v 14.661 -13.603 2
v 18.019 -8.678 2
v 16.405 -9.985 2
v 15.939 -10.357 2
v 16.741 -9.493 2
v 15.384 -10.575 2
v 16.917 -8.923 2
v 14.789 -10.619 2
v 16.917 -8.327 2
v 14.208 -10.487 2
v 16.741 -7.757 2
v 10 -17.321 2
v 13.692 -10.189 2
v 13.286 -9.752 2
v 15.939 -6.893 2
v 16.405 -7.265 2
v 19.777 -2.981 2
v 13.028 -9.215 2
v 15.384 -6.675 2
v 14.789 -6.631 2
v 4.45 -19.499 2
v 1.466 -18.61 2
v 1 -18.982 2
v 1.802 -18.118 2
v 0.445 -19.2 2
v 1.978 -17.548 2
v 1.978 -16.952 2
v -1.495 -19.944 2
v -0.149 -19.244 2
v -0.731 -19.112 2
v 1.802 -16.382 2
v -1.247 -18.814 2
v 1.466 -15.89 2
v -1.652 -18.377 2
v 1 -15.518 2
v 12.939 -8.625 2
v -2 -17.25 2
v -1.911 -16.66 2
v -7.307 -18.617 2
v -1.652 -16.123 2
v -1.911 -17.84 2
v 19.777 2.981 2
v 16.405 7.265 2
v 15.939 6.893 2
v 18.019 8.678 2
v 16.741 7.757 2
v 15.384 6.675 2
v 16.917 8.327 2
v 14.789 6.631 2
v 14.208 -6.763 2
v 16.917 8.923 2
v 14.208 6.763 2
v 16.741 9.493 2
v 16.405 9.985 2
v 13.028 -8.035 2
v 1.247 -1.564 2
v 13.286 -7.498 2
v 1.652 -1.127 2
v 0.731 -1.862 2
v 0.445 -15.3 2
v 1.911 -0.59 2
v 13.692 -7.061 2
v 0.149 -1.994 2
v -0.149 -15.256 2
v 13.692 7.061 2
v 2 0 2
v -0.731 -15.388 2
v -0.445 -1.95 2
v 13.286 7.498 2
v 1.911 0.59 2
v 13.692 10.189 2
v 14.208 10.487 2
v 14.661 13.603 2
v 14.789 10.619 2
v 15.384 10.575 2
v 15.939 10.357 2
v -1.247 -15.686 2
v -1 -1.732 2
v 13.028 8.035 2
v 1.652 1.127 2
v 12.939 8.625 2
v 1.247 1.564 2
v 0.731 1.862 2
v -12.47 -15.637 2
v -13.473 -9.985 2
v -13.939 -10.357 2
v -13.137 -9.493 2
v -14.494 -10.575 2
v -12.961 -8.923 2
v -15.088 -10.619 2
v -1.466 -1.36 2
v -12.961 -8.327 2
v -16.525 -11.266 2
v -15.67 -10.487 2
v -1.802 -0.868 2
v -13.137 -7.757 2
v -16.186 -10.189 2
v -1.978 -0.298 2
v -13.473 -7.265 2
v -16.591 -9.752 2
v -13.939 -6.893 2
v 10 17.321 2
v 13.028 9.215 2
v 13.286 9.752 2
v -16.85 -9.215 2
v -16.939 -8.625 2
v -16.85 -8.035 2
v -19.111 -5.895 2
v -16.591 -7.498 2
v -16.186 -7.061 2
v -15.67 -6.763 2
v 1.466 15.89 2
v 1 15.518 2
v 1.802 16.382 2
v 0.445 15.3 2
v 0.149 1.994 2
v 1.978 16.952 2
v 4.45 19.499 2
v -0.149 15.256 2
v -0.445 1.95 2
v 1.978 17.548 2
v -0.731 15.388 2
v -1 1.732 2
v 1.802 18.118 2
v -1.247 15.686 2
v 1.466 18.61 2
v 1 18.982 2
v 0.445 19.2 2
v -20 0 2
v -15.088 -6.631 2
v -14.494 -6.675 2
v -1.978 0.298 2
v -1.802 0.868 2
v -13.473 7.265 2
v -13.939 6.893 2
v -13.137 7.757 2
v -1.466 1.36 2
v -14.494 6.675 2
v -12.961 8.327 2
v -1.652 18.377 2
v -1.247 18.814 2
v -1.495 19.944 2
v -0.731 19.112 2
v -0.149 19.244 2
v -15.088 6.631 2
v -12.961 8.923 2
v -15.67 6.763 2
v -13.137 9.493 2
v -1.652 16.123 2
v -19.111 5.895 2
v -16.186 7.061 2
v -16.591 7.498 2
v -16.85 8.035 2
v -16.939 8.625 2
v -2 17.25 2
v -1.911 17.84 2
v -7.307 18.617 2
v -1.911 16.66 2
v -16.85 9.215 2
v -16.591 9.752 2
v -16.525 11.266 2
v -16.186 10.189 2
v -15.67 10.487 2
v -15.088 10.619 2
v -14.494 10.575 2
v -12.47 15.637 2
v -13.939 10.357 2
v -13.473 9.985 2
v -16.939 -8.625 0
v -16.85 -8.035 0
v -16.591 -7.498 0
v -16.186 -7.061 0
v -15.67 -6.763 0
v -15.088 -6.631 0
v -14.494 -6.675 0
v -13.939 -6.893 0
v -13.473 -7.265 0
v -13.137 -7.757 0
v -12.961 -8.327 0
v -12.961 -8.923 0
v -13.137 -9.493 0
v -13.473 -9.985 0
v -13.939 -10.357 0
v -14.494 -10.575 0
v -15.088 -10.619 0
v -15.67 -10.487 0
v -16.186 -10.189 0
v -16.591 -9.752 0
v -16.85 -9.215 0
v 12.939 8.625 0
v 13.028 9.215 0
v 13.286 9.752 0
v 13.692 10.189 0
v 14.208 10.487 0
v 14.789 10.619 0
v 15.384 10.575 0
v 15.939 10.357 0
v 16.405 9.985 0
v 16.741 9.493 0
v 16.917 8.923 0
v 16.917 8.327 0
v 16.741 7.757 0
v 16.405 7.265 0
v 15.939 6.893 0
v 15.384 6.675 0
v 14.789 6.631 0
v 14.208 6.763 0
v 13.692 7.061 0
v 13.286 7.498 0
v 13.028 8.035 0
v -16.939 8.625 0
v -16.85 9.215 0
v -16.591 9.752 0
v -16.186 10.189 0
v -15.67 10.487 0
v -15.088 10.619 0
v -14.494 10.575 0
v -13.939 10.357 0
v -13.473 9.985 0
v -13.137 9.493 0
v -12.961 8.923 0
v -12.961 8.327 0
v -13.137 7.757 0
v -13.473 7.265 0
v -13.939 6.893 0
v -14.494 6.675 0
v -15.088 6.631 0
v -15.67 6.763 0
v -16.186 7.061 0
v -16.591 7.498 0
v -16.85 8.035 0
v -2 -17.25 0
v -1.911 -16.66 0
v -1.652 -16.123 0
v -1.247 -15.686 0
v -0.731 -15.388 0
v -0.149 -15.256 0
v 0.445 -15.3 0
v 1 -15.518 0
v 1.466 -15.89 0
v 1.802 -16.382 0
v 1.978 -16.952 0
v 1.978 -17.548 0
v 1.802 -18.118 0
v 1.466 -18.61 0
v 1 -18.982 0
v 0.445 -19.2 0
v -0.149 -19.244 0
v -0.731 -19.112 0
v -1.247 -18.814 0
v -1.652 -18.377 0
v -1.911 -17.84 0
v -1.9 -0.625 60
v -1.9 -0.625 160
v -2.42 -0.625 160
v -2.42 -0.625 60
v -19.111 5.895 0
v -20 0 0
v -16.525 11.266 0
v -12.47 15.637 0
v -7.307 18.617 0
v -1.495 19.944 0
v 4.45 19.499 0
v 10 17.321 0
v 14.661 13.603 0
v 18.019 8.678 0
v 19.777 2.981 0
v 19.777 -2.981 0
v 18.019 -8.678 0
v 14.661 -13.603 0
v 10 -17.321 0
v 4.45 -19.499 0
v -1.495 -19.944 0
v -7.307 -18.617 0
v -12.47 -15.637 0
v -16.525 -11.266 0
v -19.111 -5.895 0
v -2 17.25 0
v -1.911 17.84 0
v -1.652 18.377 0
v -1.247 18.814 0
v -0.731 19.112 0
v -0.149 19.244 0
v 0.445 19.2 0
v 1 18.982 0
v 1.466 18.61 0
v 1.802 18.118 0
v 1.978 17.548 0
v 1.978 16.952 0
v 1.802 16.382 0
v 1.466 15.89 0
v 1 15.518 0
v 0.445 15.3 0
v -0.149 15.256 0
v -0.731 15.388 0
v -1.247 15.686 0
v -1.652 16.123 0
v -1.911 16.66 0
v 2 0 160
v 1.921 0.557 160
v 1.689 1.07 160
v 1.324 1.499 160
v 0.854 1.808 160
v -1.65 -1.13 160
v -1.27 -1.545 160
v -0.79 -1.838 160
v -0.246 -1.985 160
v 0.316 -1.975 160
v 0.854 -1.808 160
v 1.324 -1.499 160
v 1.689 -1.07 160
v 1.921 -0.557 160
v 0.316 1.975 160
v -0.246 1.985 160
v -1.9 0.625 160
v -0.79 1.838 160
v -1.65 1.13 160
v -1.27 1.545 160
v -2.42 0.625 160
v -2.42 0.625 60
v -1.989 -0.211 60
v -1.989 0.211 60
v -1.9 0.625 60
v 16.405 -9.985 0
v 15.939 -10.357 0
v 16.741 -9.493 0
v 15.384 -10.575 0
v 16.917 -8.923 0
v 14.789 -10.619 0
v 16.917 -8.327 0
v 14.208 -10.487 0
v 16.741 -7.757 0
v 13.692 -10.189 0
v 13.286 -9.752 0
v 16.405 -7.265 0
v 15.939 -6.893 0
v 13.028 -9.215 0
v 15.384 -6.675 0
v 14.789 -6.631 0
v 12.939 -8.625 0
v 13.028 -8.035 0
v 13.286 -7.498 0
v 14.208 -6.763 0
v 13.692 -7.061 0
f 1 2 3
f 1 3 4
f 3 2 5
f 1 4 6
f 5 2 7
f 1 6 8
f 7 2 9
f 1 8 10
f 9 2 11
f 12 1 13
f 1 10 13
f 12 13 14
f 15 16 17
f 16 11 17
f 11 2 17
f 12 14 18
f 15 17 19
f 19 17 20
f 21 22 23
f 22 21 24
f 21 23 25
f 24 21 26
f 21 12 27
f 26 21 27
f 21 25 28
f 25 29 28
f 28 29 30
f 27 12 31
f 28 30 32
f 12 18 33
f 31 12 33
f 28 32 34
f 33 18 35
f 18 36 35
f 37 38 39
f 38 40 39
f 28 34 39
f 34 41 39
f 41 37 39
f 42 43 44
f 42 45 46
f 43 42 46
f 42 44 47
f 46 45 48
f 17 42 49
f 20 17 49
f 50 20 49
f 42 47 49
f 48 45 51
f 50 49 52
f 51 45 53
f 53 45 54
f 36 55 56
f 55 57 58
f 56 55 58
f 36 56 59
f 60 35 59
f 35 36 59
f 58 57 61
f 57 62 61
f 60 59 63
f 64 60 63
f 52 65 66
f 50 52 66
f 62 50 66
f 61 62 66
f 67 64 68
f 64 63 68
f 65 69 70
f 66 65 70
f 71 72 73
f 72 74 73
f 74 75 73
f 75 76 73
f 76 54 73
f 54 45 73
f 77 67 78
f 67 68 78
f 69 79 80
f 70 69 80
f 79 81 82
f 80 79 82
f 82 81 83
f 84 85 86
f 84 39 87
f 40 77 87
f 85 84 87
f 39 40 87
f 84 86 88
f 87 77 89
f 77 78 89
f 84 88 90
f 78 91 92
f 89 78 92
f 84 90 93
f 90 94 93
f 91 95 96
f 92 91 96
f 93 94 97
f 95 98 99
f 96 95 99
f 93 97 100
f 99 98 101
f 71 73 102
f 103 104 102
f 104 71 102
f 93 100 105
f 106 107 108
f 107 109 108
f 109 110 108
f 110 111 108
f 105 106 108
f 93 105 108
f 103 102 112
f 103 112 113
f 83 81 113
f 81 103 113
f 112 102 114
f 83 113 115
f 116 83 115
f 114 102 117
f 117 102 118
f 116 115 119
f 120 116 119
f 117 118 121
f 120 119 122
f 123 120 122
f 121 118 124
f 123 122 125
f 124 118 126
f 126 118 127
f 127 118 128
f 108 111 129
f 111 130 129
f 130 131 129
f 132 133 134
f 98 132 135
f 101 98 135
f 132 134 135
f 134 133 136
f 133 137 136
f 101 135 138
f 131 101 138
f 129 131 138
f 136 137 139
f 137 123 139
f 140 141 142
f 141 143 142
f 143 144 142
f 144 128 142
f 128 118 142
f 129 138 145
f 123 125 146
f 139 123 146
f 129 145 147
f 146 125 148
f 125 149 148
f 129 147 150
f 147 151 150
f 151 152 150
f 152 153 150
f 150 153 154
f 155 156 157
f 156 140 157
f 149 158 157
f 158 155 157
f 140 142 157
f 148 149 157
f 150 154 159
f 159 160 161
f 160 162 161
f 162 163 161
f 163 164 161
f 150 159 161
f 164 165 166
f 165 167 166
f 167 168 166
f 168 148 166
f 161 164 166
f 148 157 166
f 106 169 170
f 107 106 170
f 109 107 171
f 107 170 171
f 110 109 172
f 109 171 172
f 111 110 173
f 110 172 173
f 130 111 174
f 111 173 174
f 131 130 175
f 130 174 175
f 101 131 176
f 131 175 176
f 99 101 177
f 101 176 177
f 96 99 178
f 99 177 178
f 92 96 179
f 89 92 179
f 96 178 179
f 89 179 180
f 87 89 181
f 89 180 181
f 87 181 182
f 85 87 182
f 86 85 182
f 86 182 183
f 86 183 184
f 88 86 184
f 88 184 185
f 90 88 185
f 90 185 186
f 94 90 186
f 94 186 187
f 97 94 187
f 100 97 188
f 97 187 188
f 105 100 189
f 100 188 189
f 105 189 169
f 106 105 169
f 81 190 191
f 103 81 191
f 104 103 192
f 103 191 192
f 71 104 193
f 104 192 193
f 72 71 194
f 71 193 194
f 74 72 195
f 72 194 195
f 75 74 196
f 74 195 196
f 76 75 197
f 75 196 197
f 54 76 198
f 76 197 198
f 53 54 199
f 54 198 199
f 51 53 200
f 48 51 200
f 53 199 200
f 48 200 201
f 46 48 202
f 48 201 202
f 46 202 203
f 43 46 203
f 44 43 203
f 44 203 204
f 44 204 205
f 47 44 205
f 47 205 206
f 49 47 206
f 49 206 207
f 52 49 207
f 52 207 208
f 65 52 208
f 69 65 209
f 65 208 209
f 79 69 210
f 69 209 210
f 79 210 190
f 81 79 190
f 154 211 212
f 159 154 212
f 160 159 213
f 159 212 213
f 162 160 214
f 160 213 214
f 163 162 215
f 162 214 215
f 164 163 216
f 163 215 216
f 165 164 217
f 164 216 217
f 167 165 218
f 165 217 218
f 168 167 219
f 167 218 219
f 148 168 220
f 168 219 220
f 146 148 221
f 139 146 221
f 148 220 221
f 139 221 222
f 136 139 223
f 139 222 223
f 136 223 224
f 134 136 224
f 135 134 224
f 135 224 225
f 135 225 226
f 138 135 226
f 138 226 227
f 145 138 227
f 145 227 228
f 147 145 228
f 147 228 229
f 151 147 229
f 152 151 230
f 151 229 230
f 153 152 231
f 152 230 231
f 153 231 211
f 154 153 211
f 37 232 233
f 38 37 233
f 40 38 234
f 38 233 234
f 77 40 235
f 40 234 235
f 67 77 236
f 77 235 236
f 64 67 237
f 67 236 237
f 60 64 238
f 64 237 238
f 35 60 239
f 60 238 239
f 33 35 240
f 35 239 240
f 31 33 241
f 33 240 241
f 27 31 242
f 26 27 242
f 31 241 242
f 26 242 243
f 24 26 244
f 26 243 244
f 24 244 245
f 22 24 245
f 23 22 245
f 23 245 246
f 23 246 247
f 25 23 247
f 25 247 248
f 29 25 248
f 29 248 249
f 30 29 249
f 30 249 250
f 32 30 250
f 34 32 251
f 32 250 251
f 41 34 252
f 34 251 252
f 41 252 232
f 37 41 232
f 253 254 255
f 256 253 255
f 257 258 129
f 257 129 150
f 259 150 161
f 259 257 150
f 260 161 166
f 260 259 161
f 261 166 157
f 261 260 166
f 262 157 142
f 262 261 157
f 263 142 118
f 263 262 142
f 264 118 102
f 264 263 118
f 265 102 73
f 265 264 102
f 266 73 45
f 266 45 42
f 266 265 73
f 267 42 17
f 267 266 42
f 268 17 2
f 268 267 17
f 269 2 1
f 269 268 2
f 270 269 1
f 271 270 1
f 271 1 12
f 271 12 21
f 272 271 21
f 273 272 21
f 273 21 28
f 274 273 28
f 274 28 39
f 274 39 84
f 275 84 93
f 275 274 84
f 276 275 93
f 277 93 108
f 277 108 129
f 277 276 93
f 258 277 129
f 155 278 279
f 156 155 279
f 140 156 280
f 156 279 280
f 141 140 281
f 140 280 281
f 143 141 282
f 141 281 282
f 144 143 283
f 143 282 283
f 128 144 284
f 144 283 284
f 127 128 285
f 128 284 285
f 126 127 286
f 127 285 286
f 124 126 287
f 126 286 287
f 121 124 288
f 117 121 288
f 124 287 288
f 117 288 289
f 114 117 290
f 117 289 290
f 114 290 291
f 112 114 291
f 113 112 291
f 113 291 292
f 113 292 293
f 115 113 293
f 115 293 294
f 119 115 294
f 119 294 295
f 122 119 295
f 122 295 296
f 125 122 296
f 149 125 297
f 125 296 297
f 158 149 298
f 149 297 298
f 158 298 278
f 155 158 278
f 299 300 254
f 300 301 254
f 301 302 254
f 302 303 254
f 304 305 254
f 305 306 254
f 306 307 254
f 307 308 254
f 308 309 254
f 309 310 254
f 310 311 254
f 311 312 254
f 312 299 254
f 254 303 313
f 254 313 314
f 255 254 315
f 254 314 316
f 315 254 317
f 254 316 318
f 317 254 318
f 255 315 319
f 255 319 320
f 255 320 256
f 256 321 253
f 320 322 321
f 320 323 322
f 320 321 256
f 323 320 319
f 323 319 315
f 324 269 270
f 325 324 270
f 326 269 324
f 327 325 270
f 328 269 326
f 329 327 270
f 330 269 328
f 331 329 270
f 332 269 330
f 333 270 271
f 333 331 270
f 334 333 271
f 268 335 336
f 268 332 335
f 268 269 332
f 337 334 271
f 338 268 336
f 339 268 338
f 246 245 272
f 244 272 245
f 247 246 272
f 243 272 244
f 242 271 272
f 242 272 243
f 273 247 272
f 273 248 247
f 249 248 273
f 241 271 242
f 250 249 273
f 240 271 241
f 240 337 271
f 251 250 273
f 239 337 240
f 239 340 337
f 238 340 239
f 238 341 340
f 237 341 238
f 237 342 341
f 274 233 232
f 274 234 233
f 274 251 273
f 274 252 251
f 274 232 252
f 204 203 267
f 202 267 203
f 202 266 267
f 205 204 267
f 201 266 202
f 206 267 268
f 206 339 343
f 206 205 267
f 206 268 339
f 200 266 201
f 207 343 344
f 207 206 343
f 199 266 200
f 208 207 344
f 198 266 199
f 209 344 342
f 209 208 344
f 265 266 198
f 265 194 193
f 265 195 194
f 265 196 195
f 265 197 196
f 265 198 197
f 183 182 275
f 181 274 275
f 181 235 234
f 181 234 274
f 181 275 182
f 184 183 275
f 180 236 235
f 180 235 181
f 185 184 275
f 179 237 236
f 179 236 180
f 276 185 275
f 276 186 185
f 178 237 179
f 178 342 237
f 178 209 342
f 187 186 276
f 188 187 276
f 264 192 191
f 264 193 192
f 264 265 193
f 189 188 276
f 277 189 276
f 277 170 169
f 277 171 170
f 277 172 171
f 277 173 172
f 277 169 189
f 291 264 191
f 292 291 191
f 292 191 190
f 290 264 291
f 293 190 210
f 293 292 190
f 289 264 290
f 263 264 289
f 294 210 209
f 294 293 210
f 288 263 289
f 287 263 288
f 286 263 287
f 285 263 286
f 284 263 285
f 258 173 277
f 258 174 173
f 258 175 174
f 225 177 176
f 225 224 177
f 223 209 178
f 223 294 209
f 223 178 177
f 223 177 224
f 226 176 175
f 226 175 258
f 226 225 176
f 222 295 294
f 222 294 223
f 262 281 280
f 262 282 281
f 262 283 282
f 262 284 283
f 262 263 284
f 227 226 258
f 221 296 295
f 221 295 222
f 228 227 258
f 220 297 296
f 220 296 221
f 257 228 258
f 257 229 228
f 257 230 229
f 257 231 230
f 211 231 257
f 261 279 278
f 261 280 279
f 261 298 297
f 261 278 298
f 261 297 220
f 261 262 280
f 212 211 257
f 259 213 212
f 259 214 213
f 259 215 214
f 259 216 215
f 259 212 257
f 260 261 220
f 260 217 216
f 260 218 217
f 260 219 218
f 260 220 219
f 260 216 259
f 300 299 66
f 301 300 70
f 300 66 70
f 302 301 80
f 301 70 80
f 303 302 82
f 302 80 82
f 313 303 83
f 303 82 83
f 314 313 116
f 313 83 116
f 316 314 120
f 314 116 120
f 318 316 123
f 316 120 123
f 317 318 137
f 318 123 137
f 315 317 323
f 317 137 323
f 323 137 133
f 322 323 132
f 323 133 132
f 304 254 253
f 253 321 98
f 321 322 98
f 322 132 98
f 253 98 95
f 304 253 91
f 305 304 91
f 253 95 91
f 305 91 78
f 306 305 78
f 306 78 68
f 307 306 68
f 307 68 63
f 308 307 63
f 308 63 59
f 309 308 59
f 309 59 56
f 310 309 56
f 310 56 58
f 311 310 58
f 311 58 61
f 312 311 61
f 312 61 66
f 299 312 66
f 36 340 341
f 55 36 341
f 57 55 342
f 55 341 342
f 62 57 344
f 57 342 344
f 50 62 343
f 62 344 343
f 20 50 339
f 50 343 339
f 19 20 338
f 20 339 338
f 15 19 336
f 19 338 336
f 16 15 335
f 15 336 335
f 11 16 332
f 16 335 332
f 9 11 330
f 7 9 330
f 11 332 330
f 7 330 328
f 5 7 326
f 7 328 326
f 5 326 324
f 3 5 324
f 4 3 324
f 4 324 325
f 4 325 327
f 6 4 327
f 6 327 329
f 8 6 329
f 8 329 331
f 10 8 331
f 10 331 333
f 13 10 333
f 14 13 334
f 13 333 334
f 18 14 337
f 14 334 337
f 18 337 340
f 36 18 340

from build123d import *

# Parameters (mm, degrees)
SKETCH_1_R          = 2
EXTRUDE_1_DEPTH     = 160
SKETCH_3_R          = 20
EXTRUDE_2_DEPTH     = 2
SKETCH_4_R          = 2
CUT_EXTRUDE_1_DEPTH = 2
EXTRUDE_3_DEPTH     = 100


with BuildPart() as part:
    # 草图1 → 凸台-拉伸1 (new body)
    with BuildSketch(Plane.XY):
        Circle(SKETCH_1_R)
    extrude(amount=EXTRUDE_1_DEPTH)

    # 草图3 → 凸台-拉伸2 (add)
    with BuildSketch(Plane(origin=(0, 0, 0), x_dir=(-1, 0, 0), z_dir=(0, 0, -1))):
        Circle(SKETCH_3_R)
    extrude(amount=-EXTRUDE_2_DEPTH)

    # 草图4 → 切除-拉伸1 (cut)
    with BuildSketch(Plane(origin=(0, 0, 0), x_dir=(-1, 0, 0), z_dir=(0, 0, -1))):
        with Locations((0, 17.25)):
            Circle(SKETCH_4_R)
        with Locations((14.938938215, 8.625)):
            Circle(SKETCH_4_R)
        with Locations((14.938938215, -8.625)):
            Circle(SKETCH_4_R)
        with Locations((0, -17.25)):
            Circle(SKETCH_4_R)
        with Locations((-14.938938215, -8.625)):
            Circle(SKETCH_4_R)
        with Locations((-14.938938215, 8.625)):
            Circle(SKETCH_4_R)
    extrude(amount=-CUT_EXTRUDE_1_DEPTH, mode=Mode.SUBTRACT)

    # 草图5 → 凸台-拉伸3 (add)
    with BuildSketch(Plane.XY.offset(160)):
        Polygon((-2.419835519, 0), (-2.419835519, 0.625), (-1.899835519, 0.625), (-1.899835519, -0.625), (-2.419835519, -0.625), align=None)
    extrude(amount=-EXTRUDE_3_DEPTH)


solid = part.part
